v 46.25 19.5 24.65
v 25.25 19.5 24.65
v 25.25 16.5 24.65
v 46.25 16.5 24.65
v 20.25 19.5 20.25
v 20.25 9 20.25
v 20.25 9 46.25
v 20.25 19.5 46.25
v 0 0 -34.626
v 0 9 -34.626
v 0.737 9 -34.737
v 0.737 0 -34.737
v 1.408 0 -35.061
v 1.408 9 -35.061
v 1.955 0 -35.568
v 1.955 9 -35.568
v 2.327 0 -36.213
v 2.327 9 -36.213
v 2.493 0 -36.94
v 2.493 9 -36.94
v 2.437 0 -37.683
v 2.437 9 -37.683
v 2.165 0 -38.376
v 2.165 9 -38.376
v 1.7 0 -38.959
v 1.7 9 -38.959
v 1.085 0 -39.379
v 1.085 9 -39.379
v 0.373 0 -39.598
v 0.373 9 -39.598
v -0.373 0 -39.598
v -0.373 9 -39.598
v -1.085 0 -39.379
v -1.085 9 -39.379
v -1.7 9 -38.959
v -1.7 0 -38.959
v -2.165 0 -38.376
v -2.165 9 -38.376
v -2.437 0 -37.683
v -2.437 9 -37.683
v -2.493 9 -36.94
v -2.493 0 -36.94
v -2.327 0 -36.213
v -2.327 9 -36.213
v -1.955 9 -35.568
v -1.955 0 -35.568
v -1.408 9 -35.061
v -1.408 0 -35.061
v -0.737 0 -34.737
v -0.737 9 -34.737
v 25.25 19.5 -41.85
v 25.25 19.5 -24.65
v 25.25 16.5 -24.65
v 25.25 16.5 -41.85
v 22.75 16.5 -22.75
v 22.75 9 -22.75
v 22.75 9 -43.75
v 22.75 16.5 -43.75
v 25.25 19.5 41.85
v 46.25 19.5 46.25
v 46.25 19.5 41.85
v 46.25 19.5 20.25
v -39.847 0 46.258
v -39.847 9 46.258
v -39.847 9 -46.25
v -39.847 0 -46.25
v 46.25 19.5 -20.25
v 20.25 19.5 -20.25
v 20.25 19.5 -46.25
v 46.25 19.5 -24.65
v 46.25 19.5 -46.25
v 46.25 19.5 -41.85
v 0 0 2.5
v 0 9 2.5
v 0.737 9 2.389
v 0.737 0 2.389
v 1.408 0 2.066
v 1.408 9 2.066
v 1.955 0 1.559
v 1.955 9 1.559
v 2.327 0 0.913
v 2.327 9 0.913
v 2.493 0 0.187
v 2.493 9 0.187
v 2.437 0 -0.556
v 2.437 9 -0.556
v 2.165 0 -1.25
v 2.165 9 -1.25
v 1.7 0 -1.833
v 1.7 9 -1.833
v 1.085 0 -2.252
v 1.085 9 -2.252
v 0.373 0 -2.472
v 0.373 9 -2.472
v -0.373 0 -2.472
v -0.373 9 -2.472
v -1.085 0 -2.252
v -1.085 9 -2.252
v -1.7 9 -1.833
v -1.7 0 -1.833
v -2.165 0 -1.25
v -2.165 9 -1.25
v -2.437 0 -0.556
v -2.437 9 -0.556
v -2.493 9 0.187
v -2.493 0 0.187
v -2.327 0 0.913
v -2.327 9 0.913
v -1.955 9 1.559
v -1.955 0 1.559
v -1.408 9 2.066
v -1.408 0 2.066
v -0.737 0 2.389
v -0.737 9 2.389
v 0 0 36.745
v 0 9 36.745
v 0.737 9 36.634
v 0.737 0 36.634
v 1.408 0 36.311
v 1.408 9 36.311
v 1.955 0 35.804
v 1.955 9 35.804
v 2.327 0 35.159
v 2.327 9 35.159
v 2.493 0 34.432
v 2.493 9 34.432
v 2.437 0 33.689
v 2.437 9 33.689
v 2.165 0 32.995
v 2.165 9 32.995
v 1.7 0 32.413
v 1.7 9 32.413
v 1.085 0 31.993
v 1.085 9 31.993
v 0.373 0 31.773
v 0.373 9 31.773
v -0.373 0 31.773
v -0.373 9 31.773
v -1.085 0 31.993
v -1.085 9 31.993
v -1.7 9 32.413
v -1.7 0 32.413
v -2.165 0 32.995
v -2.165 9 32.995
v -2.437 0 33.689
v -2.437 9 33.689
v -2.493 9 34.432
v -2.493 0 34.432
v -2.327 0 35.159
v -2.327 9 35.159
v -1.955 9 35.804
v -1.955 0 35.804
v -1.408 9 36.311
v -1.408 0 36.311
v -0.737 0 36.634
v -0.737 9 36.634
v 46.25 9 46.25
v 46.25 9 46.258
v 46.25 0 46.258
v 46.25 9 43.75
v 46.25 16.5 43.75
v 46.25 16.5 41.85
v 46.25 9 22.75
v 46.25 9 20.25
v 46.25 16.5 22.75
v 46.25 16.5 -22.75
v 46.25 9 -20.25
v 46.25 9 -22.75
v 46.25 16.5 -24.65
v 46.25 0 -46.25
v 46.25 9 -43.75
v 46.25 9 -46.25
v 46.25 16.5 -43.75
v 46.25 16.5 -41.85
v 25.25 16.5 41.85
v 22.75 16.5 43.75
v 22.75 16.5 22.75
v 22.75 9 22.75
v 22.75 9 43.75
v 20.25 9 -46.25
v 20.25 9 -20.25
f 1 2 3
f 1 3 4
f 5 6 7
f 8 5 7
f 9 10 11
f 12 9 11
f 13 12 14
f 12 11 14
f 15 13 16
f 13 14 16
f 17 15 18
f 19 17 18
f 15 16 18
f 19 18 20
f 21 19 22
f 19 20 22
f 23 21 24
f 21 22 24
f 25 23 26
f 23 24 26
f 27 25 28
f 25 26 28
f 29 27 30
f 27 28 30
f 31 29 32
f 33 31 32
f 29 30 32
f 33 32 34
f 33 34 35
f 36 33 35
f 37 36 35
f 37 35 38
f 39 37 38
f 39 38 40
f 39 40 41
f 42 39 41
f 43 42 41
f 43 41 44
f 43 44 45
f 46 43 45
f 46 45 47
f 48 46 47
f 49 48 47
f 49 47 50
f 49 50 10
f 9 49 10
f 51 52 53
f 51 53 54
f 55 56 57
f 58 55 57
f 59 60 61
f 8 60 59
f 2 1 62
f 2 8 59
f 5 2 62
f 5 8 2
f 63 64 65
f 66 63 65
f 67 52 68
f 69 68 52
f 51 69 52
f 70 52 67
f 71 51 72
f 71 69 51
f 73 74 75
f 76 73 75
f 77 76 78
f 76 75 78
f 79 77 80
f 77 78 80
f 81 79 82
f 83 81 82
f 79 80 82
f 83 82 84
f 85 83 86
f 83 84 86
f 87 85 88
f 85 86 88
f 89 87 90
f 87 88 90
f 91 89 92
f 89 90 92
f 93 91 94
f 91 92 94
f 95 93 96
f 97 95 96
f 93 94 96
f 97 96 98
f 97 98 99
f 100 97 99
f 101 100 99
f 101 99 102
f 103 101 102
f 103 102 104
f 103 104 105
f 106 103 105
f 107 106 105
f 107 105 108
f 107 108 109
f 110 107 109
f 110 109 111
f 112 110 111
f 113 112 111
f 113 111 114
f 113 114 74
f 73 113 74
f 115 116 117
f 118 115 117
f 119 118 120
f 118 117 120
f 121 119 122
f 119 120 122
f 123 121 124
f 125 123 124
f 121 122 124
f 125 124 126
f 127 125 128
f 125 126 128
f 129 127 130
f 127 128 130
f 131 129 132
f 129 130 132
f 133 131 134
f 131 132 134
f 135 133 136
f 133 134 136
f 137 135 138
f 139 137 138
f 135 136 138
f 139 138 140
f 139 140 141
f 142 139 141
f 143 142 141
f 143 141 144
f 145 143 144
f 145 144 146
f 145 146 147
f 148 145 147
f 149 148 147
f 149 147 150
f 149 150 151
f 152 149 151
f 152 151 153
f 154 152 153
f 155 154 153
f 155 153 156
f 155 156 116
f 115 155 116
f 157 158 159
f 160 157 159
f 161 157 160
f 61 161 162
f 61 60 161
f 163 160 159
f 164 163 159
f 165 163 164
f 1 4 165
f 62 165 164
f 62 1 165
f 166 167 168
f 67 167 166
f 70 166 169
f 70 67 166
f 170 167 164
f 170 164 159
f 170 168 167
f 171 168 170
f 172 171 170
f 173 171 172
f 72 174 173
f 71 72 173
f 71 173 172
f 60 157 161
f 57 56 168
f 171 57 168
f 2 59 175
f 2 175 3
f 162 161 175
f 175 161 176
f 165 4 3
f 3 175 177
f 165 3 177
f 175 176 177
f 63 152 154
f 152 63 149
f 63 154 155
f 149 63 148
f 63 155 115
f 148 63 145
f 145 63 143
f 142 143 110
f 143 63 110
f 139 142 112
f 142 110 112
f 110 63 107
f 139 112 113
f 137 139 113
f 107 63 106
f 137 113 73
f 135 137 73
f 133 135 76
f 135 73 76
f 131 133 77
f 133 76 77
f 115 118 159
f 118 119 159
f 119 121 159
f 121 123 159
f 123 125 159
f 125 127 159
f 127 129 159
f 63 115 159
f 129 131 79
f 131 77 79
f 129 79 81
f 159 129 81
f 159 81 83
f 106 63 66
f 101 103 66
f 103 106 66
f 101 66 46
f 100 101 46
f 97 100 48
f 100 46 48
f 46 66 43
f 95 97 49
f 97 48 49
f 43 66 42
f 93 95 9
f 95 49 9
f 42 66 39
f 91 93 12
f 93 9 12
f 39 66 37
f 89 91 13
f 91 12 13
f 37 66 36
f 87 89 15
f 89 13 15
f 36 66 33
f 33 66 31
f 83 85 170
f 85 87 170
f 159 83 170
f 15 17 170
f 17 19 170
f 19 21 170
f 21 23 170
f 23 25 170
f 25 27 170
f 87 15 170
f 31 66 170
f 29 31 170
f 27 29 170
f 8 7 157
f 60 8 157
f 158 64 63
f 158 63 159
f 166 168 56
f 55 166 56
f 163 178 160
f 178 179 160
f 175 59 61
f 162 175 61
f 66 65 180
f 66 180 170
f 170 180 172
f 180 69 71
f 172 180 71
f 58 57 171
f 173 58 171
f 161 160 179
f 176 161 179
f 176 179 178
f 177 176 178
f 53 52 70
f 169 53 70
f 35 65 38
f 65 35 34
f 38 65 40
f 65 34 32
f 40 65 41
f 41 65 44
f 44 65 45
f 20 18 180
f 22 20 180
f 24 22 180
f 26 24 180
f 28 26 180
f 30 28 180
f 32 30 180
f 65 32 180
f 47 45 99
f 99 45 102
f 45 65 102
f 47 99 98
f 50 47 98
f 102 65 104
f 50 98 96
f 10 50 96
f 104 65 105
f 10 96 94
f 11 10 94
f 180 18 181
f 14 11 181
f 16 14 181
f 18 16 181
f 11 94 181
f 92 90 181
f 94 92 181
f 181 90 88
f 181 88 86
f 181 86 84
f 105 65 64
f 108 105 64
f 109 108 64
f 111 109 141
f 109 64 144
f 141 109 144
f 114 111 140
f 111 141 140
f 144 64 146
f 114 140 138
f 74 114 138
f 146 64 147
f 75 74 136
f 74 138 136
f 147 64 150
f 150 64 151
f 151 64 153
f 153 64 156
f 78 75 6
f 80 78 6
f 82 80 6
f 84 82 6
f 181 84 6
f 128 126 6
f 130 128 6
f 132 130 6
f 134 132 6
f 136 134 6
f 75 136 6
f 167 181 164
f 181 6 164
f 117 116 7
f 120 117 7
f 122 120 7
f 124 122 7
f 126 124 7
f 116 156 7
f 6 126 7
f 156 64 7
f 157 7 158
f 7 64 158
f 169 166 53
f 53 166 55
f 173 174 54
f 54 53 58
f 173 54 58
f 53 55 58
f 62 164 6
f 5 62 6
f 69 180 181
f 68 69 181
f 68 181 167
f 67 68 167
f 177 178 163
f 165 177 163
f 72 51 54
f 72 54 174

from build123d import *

# Parameters (mm, degrees)
SKETCH1_W            = 133
SKETCH1_H            = 133
BOSS_EXTRUDE2_DEPTH  = 136
SKETCH2_W            = 133
SKETCH2_H            = 118
CUT_EXTRUDE1_DEPTH   = 136
BOSS_EXTRUDE3_DEPTH  = 10.5
SKETCH5_W            = 21
SKETCH5_H            = 3
BOSS_EXTRUDE4_DEPTH  = 23.5
SKETCH6_W            = 42
SKETCH6_H            = 17.2
CUT_EXTRUDE2_DEPTH   = 3
BOSS_EXTRUDE5_DEPTH  = 10.5
SKETCH8_W            = 21
SKETCH8_H            = 3
BOSS_EXTRUDE6_DEPTH  = 23.5
SKETCH9_W            = 42
SKETCH9_H            = 17.2
CUT_EXTRUDE3_DEPTH   = 3
SKETCH10_W           = 19.261488562
SKETCH10_H           = 133
BOSS_EXTRUDE7_DEPTH  = 5
SKETCH11_W           = 18.43727499
SKETCH11_H           = 133
BOSS_EXTRUDE8_DEPTH  = 5
SKETCH12_W           = 18.849381776
SKETCH12_H           = 146
BOSS_EXTRUDE9_DEPTH  = 12
SKETCH14_W           = 18.849381776
SKETCH14_H           = 146
BOSS_EXTRUDE10_DEPTH = 12
SKETCH17_R           = 1
CUT_EXTRUDE4_DEPTH   = 222.251553667
SKETCH20_W           = 133.244561713
SKETCH20_H           = 5
CUT_EXTRUDE10_DEPTH  = 19
SKETCH21_W           = 157
SKETCH21_H           = 120.66580897
CUT_EXTRUDE11_DEPTH  = 118
SKETCH22_W           = 186.174267818
SKETCH22_H           = 42.2523161
CUT_EXTRUDE12_DEPTH  = 118
SKETCH23_W           = 12
SKETCH23_H           = 25.33419103
CUT_EXTRUDE13_DEPTH  = 118
SKETCH24_W           = 12
SKETCH24_H           = 25.33419103
CUT_EXTRUDE14_DEPTH  = 118
SKETCH31_R           = 2.5
CUT_EXTRUDE21_DEPTH  = 118
SKETCH32_R           = 2.5
CUT_EXTRUDE22_DEPTH  = 118
SKETCH33_W           = 133
SKETCH33_H           = 5
CUT_EXTRUDE24_DEPTH  = 118
SKETCH34_R           = 2.5
CUT_EXTRUDE25_DEPTH  = 118
SKETCH35_W           = 133
SKETCH35_H           = 133
SKETCH35_W_2         = 86.097023631
SKETCH35_H_2         = 92.508019
CUT_EXTRUDE27_DEPTH  = 10
SKETCH36_R           = 2.5
CUT_EXTRUDE28_DEPTH  = 178
SKETCH37_R           = 2.5
CUT_EXTRUDE29_DEPTH  = 42


with BuildPart() as part:
    # Sketch1 → Boss-Extrude2 (new body)
    with BuildSketch(Plane(origin=(0, 0, 0), x_dir=(1, 0, 0), z_dir=(0, 1, 0))):
        Rectangle(SKETCH1_W, SKETCH1_H)
    extrude(amount=BOSS_EXTRUDE2_DEPTH)

    # Sketch2 → Cut-Extrude1 (cut)
    with BuildSketch(Plane.XY.offset(66.5)):
        with Locations((0, 68)):
            Rectangle(SKETCH2_W, SKETCH2_H)
    extrude(amount=-CUT_EXTRUDE1_DEPTH, mode=Mode.SUBTRACT)


with BuildPart() as cut_extrude1_piece_1:
    # of the separate pieces the step leaves, piece 1, a body of its own (cut_extrude1_pieces)
    add(part.part.solids().sort_by_distance((-66.5, 0, 66.5))[0])

    # Sketch4 → Boss-Extrude3 (add)
    with BuildSketch(Plane(origin=(0, 9, 0), x_dir=(1, 0, 0), z_dir=(0, 1, 0))):
        Polygon((22.75, -22.75), (43.75, -22.75), (46.25, -22.75), (46.25, -20.25), (20.25, -20.25), (20.25, -46.25), (46.25, -46.25), (46.25, -43.75), (43.75, -43.75), (22.75, -43.75), align=None)
        Polygon((22.75, 43.75), (43.75, 43.75), (46.25, 43.75), (46.25, 46.25), (20.25, 46.25), (20.25, 20.25), (46.25, 20.25), (46.25, 22.75), (43.75, 22.75), (22.75, 22.75), align=None)
    extrude(amount=BOSS_EXTRUDE3_DEPTH)

    # Sketch5 → Boss-Extrude4 (add)
    with BuildSketch(Plane(origin=(22.75, 0, 0), x_dir=(0, 0, -1), z_dir=(1, 0, 0))):
        with Locations((-33.25, 18)):
            Rectangle(SKETCH5_W, SKETCH5_H)
        with Locations((33.25, 18)):
            Rectangle(SKETCH5_W, SKETCH5_H)
    extrude(amount=BOSS_EXTRUDE4_DEPTH)

    # Sketch6 → Cut-Extrude2 (cut)
    with BuildSketch(Plane(origin=(0, 19.5, 0), x_dir=(1, 0, 0), z_dir=(0, 1, 0))):
        with Locations((46.25, -33.25)):
            Rectangle(SKETCH6_W, SKETCH6_H)
        with Locations((46.25, 33.25)):
            Rectangle(SKETCH6_W, SKETCH6_H)
    extrude(amount=-CUT_EXTRUDE2_DEPTH, mode=Mode.SUBTRACT)

    # Sketch10 → Boss-Extrude7 (add)
    with BuildSketch(Plane.XZ):
        Rectangle(SKETCH10_W, SKETCH10_H)
    extrude(amount=BOSS_EXTRUDE7_DEPTH)



with BuildPart() as cut_extrude1_piece_2:
    # of the separate pieces the step leaves, piece 2, a body of its own (cut_extrude1_pieces)
    add(part.part.solids().sort_by_distance((66.5, 127, 66.5))[0])

    # Sketch7 → Boss-Extrude5 (add)
    with BuildSketch(Plane.XZ.offset(-127)):
        Polygon((-43.75, 43.75), (-22.75, 43.75), (-22.75, 22.75), (-43.75, 22.75), (-46.25, 22.75), (-46.25, 20.25), (-20.25, 20.25), (-20.25, 46.25), (-46.25, 46.25), (-46.25, 43.75), align=None)
        Polygon((-43.75, -22.75), (-22.75, -22.75), (-22.75, -43.75), (-43.75, -43.75), (-46.25, -43.75), (-46.25, -46.25), (-20.25, -46.25), (-20.25, -20.25), (-46.25, -20.25), (-46.25, -22.75), align=None)
    extrude(amount=BOSS_EXTRUDE5_DEPTH)

    # Sketch8 → Boss-Extrude6 (add)
    with BuildSketch(Plane.ZY.offset(22.75)):
        with Locations((33.25, 118)):
            Rectangle(SKETCH8_W, SKETCH8_H)
        with Locations((-33.25, 118)):
            Rectangle(SKETCH8_W, SKETCH8_H)
    extrude(amount=BOSS_EXTRUDE6_DEPTH)

    # Sketch9 → Cut-Extrude3 (cut)
    with BuildSketch(Plane.XZ.offset(-116.5)):
        with Locations((-46.25, 33.25)):
            Rectangle(SKETCH9_W, SKETCH9_H)
        with Locations((-46.25, -33.25)):
            Rectangle(SKETCH9_W, SKETCH9_H)
    extrude(amount=-CUT_EXTRUDE3_DEPTH, mode=Mode.SUBTRACT)

    # Sketch11 → Boss-Extrude8 (add)
    with BuildSketch(Plane(origin=(0, 136, 0), x_dir=(1, 0, 0), z_dir=(0, 1, 0))):
        Rectangle(SKETCH11_W, SKETCH11_H)
    extrude(amount=BOSS_EXTRUDE8_DEPTH)


with BuildPart() as cut_extrude1_piece_1_1:
    add(cut_extrude1_piece_1.part)

    add(cut_extrude1_piece_2.part)  # Boss-Extrude9 merges Cut-Extrude1 piece 2
    # Sketch12 → Boss-Extrude9 (add)
    with BuildSketch(Plane(origin=(0, 0, -66.5), x_dir=(-1, 0, 0), z_dir=(0, 0, -1))):
        with Locations((-0.206053393, 68)):
            Rectangle(SKETCH12_W, SKETCH12_H)
    extrude(amount=BOSS_EXTRUDE9_DEPTH)

    # Sketch14 → Boss-Extrude10 (add)
    with BuildSketch(Plane.XY.offset(66.5)):
        with Locations((0.206053393, 68)):
            Rectangle(SKETCH14_W, SKETCH14_H)
    extrude(amount=BOSS_EXTRUDE10_DEPTH)

    # Sketch17 → Cut-Extrude4 (cut, through all)
    with BuildSketch(Plane.XY.offset(78.5)):
        with Locations((0.206053393, 68)):
            Circle(SKETCH17_R)
    extrude(amount=-CUT_EXTRUDE4_DEPTH, mode=Mode.SUBTRACT)

    # Sketch20 → Cut-Extrude10 (cut)
    with BuildSketch(Plane.ZY.offset(9.218637495)):
        with Locations((0.122280857, 138.5)):
            Rectangle(SKETCH20_W, SKETCH20_H)
    extrude(amount=-CUT_EXTRUDE10_DEPTH, mode=Mode.SUBTRACT)

    # Sketch21 → Cut-Extrude11 (cut)
    with BuildSketch(Plane.ZY.offset(9.218637495)):
        with Locations((0, 80.667095515)):
            Rectangle(SKETCH21_W, SKETCH21_H)
    extrude(amount=-CUT_EXTRUDE11_DEPTH, mode=Mode.SUBTRACT)


with BuildPart() as cut_extrude11_piece_1:
    # of the separate pieces the step leaves, piece 1, a body of its own (cut_extrude11_pieces)
    add(cut_extrude1_piece_1_1.part.solids().sort_by_distance((9.630744281, 20.33419103, 66.5))[0])

    # Sketch23 → Cut-Extrude13 (cut)
    with BuildSketch(Plane.ZY.offset(9.218637495)):
        with Locations((-72.5, 7.667095515)):
            Rectangle(SKETCH23_W, SKETCH23_H)
    extrude(amount=-CUT_EXTRUDE13_DEPTH, mode=Mode.SUBTRACT)

    # Sketch24 → Cut-Extrude14 (cut)
    with BuildSketch(Plane.ZY.offset(9.218637495)):
        with Locations((72.5, 7.667095515)):
            Rectangle(SKETCH24_W, SKETCH24_H)
    extrude(amount=-CUT_EXTRUDE14_DEPTH, mode=Mode.SUBTRACT)

    # Sketch31 → Cut-Extrude21 (cut)
    with BuildSketch(Plane.XZ.offset(5)):
        with Locations(Location((0, 59.499471122, 0), (0, 0, 270))):
            Circle(SKETCH31_R)
    extrude(amount=-CUT_EXTRUDE21_DEPTH, mode=Mode.SUBTRACT)

    # Sketch32 → Cut-Extrude22 (cut)
    with BuildSketch(Plane.XZ.offset(5)):
        with Locations(Location((0, -59.159797643, 0), (0, 0, 270))):
            Circle(SKETCH32_R)
    extrude(amount=-CUT_EXTRUDE22_DEPTH, mode=Mode.SUBTRACT)

    # Sketch33 → Cut-Extrude24 (cut)
    with BuildSketch(Plane.ZY.offset(9.630744281)):
        with Locations((0, -2.5)):
            Rectangle(SKETCH33_W, SKETCH33_H)
    extrude(amount=-CUT_EXTRUDE24_DEPTH, mode=Mode.SUBTRACT)

    # Sketch34 → Cut-Extrude25 (cut)
    with BuildSketch(Plane(origin=(0, 9, 0), x_dir=(1, 0, 0), z_dir=(0, 1, 0))):
        with Locations(Location((0, 0, 0), (0, 0, 270))):
            Circle(SKETCH34_R)
    extrude(amount=-CUT_EXTRUDE25_DEPTH, mode=Mode.SUBTRACT)

    # Sketch35 → Cut-Extrude27 (cut)
    with BuildSketch(Plane(origin=(0, 9, 0), x_dir=(1, 0, 0), z_dir=(0, 1, 0))):
        Rectangle(SKETCH35_W, SKETCH35_H)
        with Locations((3.201488185, -0.0040095)):
            Rectangle(SKETCH35_W_2, SKETCH35_H_2, mode=Mode.SUBTRACT)
    extrude(amount=-CUT_EXTRUDE27_DEPTH, mode=Mode.SUBTRACT)

    # Sketch36 → Cut-Extrude28 (cut)
    with BuildSketch(Plane(origin=(0, 9, 0), x_dir=(1, 0, 0), z_dir=(0, 1, 0))):
        with Locations(Location((0, 37.126366322, 0), (0, 0, 270))):
            Circle(SKETCH36_R)
    extrude(amount=-CUT_EXTRUDE28_DEPTH, mode=Mode.SUBTRACT)

    # Sketch37 → Cut-Extrude29 (cut)
    with BuildSketch(Plane(origin=(0, 9, 0), x_dir=(1, 0, 0), z_dir=(0, 1, 0))):
        with Locations(Location((0, -34.245307912, 0), (0, 0, 270))):
            Circle(SKETCH37_R)
    extrude(amount=-CUT_EXTRUDE29_DEPTH, mode=Mode.SUBTRACT)


with BuildPart() as cut_extrude11_piece_2:
    # of the separate pieces the step leaves, piece 2, a body of its own (cut_extrude11_pieces)
    add(cut_extrude1_piece_1_1.part.solids().sort_by_distance((-9.218637495, 127, 66.5))[0])

    # Sketch22 → Cut-Extrude12 (cut)
    with BuildSketch(Plane.ZY.offset(66.5)):
        with Locations((20.706035589, 120.536042421)):
            Rectangle(SKETCH22_W, SKETCH22_H)
    extrude(amount=-CUT_EXTRUDE12_DEPTH, mode=Mode.SUBTRACT)


solid = cut_extrude11_piece_1.part
